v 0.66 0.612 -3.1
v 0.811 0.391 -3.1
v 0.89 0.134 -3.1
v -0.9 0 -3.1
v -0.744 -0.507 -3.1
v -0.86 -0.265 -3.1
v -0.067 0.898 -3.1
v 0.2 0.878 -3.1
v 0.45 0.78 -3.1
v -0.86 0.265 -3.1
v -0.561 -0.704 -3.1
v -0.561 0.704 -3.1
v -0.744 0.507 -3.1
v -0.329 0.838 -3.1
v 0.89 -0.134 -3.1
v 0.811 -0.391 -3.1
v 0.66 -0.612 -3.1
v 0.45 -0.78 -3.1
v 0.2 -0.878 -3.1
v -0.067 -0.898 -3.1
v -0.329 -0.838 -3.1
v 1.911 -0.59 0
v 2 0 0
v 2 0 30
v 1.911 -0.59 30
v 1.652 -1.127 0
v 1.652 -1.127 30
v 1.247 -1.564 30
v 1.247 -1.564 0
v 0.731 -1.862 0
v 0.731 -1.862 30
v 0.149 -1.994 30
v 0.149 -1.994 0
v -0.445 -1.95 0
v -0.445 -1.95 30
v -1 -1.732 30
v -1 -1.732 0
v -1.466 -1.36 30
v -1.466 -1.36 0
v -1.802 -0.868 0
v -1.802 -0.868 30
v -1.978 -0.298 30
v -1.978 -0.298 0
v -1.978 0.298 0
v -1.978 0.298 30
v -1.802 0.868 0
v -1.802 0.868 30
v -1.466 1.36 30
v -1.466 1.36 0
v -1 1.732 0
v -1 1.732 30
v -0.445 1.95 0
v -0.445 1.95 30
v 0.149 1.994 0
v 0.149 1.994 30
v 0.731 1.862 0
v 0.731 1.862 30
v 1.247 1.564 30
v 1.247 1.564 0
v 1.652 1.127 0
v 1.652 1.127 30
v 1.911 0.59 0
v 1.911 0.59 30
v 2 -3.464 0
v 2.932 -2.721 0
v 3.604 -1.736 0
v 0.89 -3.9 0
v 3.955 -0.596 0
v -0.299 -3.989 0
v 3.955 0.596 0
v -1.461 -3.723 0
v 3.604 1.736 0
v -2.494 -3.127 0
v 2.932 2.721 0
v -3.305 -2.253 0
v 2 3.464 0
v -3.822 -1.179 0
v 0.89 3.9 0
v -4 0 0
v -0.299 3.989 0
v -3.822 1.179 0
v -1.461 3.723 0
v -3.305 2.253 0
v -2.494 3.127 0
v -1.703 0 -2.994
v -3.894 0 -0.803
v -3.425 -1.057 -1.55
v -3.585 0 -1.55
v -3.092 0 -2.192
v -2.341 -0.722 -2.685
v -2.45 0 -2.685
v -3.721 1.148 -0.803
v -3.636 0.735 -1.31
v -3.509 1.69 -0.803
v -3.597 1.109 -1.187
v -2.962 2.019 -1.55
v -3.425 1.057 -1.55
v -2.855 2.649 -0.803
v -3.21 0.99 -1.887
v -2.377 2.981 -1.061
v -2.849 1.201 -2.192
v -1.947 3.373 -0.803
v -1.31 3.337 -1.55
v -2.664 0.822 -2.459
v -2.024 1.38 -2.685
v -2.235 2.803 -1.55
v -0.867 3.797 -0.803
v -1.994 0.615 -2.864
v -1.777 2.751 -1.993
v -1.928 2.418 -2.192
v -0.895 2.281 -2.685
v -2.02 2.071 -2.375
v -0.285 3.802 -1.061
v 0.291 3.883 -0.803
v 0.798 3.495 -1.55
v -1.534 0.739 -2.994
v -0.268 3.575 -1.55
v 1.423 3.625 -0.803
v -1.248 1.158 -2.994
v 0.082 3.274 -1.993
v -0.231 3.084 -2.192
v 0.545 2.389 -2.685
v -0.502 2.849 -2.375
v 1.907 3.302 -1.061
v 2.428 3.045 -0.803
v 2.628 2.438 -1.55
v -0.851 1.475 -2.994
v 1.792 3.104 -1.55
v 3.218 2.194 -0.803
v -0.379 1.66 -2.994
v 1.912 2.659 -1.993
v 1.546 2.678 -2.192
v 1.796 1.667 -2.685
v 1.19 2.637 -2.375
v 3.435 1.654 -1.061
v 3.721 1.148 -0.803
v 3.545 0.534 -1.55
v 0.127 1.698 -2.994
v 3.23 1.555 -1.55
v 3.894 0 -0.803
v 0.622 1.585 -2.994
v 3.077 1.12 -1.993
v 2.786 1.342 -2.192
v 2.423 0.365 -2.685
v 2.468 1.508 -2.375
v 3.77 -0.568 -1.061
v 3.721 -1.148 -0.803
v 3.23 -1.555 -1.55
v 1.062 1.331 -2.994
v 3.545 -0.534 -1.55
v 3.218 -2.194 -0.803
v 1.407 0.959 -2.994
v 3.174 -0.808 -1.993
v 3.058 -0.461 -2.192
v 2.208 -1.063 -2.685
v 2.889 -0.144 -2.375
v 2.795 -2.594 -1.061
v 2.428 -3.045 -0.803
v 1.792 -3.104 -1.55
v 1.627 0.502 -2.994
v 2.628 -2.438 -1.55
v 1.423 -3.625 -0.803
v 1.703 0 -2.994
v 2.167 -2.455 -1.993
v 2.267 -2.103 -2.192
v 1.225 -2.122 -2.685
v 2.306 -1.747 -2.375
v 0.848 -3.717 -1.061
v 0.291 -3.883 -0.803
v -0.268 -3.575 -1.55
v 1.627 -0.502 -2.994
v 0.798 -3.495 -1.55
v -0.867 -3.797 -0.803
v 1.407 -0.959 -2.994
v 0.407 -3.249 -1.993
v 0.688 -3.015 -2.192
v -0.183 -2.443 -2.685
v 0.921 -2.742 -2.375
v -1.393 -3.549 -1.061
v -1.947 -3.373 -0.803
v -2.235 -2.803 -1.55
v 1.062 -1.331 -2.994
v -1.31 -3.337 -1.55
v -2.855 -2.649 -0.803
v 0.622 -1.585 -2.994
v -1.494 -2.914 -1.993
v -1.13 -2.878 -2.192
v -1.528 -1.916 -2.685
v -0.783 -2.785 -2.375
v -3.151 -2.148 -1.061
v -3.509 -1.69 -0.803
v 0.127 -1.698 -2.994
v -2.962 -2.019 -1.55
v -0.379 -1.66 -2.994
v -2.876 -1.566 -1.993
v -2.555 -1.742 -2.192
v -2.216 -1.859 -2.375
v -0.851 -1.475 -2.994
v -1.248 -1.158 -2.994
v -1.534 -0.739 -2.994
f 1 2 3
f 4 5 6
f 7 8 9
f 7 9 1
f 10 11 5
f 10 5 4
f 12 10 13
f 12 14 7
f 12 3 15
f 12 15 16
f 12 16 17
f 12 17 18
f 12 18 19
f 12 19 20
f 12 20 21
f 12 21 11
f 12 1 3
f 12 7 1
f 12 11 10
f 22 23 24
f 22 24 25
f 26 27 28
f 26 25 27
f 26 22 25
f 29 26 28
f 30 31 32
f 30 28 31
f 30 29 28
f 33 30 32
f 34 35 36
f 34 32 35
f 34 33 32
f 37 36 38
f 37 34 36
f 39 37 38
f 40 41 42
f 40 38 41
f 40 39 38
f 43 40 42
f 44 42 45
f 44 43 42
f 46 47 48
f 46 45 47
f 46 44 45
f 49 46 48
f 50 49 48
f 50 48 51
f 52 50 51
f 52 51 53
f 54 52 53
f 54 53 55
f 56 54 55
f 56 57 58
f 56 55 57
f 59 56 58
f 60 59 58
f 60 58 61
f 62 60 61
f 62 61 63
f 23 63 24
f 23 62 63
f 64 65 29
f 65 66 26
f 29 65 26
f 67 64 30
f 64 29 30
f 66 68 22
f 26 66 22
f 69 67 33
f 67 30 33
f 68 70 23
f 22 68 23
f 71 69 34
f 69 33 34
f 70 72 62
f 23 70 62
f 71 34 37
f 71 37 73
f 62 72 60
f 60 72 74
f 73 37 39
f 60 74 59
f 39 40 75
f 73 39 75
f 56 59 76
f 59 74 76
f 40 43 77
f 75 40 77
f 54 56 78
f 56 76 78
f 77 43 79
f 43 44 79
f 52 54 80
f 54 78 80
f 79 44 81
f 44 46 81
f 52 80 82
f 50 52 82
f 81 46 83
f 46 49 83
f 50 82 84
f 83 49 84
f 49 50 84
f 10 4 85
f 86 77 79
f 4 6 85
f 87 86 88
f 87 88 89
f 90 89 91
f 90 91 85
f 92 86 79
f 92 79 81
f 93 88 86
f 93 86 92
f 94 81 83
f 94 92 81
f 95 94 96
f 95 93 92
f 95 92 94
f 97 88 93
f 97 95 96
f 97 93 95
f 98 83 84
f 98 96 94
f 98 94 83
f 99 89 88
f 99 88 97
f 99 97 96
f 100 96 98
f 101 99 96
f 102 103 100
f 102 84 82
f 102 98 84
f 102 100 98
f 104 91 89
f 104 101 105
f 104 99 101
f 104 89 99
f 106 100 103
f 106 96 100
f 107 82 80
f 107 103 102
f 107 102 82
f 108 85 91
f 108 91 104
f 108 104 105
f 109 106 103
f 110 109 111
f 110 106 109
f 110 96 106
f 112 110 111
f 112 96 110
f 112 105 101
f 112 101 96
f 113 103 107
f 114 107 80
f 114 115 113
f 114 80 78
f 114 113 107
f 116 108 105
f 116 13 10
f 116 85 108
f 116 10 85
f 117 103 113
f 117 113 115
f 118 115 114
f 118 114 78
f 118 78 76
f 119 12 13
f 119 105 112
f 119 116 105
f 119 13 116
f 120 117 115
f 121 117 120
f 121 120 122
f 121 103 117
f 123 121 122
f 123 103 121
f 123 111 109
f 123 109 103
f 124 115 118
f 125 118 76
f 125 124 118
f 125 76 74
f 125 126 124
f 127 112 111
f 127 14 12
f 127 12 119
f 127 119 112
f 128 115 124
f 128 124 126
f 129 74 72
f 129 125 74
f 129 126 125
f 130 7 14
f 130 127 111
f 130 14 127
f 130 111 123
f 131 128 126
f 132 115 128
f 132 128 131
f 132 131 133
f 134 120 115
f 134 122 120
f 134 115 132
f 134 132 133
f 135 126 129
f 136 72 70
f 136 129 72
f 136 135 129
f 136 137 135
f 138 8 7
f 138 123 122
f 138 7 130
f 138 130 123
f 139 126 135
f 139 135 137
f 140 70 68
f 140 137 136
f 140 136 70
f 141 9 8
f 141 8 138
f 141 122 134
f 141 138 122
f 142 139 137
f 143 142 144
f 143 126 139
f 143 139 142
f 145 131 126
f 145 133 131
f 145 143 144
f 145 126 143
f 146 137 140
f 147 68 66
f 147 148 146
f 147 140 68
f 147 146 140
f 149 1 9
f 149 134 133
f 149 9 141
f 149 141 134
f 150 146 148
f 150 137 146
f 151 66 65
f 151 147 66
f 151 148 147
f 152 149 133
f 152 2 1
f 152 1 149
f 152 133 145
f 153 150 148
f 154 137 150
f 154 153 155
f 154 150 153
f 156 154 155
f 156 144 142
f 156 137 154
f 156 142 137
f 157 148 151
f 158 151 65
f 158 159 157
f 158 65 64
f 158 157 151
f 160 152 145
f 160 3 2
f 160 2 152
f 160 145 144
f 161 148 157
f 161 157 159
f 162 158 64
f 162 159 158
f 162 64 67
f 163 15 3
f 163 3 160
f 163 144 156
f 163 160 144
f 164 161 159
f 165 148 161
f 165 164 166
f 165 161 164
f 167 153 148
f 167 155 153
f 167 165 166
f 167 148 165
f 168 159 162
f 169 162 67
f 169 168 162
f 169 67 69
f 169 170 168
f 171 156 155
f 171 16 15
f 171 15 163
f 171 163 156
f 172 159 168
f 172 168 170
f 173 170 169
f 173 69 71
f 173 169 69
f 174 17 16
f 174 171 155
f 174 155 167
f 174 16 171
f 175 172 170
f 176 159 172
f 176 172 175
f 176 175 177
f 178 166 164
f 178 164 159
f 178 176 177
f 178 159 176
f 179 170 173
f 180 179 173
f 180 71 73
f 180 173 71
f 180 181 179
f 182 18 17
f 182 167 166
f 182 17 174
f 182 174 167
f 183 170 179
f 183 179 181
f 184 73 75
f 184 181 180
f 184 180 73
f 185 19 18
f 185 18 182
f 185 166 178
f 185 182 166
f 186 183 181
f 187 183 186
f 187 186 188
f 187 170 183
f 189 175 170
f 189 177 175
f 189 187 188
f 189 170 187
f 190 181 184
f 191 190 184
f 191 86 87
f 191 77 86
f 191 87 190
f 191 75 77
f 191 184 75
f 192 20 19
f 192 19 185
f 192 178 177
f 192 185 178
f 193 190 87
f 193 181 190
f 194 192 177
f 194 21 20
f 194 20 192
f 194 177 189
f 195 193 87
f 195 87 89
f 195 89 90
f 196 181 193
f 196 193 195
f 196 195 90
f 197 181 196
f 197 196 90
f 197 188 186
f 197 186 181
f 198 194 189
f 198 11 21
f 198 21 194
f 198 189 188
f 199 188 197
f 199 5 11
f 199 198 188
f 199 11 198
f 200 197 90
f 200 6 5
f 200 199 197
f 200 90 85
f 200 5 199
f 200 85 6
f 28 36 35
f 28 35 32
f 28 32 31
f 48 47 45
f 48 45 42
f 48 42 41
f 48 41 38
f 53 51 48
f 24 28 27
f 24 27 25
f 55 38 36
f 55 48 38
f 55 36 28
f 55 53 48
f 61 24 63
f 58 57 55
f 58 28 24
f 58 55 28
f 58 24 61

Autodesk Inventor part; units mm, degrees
ref_plane "YZ Plane" through (0, 0, 0) normal (1, 0, 0) x (0, 1, 0)
ref_plane "XZ Plane" through (0, 0, 0) normal (0, 1, 0) x (-1, 0, 0)
ref_plane "XY Plane" through (0, 0, 0) normal (0, 0, 1) x (1, 0, 0)
sketch "スケッチ1" plane through (0, 0, 0) normal (0, 0, 1) x (1, 0, 0)
  circle A0 centre (0, 0) radius 2
  dimension "d1" = 4
extrude "押し出し1" add sketch "スケッチ1" along normal blind 30
sketch "スケッチ2" plane through (0, 0, 0) normal (0, 0, -1) x (-1, 0, 0)
  circle A0 centre (0, 0) radius 2 projected
  circle A1 centre (0, 0) radius 4
  dimension "d4" = 8
extrude "押し出し2" add sketch "スケッチ2" along normal blind 3.1 contours A0 | A1
fillet "フィレット1" radius 3.1 1 edges at (4, 0, -3.1)
thread "ねじ1" size "M4x0.7" class "6g" standard "ANSI Metric M Profile" full length
properties part number "ネジ鍋m4,30" material "鋼、高強度、低合金"
